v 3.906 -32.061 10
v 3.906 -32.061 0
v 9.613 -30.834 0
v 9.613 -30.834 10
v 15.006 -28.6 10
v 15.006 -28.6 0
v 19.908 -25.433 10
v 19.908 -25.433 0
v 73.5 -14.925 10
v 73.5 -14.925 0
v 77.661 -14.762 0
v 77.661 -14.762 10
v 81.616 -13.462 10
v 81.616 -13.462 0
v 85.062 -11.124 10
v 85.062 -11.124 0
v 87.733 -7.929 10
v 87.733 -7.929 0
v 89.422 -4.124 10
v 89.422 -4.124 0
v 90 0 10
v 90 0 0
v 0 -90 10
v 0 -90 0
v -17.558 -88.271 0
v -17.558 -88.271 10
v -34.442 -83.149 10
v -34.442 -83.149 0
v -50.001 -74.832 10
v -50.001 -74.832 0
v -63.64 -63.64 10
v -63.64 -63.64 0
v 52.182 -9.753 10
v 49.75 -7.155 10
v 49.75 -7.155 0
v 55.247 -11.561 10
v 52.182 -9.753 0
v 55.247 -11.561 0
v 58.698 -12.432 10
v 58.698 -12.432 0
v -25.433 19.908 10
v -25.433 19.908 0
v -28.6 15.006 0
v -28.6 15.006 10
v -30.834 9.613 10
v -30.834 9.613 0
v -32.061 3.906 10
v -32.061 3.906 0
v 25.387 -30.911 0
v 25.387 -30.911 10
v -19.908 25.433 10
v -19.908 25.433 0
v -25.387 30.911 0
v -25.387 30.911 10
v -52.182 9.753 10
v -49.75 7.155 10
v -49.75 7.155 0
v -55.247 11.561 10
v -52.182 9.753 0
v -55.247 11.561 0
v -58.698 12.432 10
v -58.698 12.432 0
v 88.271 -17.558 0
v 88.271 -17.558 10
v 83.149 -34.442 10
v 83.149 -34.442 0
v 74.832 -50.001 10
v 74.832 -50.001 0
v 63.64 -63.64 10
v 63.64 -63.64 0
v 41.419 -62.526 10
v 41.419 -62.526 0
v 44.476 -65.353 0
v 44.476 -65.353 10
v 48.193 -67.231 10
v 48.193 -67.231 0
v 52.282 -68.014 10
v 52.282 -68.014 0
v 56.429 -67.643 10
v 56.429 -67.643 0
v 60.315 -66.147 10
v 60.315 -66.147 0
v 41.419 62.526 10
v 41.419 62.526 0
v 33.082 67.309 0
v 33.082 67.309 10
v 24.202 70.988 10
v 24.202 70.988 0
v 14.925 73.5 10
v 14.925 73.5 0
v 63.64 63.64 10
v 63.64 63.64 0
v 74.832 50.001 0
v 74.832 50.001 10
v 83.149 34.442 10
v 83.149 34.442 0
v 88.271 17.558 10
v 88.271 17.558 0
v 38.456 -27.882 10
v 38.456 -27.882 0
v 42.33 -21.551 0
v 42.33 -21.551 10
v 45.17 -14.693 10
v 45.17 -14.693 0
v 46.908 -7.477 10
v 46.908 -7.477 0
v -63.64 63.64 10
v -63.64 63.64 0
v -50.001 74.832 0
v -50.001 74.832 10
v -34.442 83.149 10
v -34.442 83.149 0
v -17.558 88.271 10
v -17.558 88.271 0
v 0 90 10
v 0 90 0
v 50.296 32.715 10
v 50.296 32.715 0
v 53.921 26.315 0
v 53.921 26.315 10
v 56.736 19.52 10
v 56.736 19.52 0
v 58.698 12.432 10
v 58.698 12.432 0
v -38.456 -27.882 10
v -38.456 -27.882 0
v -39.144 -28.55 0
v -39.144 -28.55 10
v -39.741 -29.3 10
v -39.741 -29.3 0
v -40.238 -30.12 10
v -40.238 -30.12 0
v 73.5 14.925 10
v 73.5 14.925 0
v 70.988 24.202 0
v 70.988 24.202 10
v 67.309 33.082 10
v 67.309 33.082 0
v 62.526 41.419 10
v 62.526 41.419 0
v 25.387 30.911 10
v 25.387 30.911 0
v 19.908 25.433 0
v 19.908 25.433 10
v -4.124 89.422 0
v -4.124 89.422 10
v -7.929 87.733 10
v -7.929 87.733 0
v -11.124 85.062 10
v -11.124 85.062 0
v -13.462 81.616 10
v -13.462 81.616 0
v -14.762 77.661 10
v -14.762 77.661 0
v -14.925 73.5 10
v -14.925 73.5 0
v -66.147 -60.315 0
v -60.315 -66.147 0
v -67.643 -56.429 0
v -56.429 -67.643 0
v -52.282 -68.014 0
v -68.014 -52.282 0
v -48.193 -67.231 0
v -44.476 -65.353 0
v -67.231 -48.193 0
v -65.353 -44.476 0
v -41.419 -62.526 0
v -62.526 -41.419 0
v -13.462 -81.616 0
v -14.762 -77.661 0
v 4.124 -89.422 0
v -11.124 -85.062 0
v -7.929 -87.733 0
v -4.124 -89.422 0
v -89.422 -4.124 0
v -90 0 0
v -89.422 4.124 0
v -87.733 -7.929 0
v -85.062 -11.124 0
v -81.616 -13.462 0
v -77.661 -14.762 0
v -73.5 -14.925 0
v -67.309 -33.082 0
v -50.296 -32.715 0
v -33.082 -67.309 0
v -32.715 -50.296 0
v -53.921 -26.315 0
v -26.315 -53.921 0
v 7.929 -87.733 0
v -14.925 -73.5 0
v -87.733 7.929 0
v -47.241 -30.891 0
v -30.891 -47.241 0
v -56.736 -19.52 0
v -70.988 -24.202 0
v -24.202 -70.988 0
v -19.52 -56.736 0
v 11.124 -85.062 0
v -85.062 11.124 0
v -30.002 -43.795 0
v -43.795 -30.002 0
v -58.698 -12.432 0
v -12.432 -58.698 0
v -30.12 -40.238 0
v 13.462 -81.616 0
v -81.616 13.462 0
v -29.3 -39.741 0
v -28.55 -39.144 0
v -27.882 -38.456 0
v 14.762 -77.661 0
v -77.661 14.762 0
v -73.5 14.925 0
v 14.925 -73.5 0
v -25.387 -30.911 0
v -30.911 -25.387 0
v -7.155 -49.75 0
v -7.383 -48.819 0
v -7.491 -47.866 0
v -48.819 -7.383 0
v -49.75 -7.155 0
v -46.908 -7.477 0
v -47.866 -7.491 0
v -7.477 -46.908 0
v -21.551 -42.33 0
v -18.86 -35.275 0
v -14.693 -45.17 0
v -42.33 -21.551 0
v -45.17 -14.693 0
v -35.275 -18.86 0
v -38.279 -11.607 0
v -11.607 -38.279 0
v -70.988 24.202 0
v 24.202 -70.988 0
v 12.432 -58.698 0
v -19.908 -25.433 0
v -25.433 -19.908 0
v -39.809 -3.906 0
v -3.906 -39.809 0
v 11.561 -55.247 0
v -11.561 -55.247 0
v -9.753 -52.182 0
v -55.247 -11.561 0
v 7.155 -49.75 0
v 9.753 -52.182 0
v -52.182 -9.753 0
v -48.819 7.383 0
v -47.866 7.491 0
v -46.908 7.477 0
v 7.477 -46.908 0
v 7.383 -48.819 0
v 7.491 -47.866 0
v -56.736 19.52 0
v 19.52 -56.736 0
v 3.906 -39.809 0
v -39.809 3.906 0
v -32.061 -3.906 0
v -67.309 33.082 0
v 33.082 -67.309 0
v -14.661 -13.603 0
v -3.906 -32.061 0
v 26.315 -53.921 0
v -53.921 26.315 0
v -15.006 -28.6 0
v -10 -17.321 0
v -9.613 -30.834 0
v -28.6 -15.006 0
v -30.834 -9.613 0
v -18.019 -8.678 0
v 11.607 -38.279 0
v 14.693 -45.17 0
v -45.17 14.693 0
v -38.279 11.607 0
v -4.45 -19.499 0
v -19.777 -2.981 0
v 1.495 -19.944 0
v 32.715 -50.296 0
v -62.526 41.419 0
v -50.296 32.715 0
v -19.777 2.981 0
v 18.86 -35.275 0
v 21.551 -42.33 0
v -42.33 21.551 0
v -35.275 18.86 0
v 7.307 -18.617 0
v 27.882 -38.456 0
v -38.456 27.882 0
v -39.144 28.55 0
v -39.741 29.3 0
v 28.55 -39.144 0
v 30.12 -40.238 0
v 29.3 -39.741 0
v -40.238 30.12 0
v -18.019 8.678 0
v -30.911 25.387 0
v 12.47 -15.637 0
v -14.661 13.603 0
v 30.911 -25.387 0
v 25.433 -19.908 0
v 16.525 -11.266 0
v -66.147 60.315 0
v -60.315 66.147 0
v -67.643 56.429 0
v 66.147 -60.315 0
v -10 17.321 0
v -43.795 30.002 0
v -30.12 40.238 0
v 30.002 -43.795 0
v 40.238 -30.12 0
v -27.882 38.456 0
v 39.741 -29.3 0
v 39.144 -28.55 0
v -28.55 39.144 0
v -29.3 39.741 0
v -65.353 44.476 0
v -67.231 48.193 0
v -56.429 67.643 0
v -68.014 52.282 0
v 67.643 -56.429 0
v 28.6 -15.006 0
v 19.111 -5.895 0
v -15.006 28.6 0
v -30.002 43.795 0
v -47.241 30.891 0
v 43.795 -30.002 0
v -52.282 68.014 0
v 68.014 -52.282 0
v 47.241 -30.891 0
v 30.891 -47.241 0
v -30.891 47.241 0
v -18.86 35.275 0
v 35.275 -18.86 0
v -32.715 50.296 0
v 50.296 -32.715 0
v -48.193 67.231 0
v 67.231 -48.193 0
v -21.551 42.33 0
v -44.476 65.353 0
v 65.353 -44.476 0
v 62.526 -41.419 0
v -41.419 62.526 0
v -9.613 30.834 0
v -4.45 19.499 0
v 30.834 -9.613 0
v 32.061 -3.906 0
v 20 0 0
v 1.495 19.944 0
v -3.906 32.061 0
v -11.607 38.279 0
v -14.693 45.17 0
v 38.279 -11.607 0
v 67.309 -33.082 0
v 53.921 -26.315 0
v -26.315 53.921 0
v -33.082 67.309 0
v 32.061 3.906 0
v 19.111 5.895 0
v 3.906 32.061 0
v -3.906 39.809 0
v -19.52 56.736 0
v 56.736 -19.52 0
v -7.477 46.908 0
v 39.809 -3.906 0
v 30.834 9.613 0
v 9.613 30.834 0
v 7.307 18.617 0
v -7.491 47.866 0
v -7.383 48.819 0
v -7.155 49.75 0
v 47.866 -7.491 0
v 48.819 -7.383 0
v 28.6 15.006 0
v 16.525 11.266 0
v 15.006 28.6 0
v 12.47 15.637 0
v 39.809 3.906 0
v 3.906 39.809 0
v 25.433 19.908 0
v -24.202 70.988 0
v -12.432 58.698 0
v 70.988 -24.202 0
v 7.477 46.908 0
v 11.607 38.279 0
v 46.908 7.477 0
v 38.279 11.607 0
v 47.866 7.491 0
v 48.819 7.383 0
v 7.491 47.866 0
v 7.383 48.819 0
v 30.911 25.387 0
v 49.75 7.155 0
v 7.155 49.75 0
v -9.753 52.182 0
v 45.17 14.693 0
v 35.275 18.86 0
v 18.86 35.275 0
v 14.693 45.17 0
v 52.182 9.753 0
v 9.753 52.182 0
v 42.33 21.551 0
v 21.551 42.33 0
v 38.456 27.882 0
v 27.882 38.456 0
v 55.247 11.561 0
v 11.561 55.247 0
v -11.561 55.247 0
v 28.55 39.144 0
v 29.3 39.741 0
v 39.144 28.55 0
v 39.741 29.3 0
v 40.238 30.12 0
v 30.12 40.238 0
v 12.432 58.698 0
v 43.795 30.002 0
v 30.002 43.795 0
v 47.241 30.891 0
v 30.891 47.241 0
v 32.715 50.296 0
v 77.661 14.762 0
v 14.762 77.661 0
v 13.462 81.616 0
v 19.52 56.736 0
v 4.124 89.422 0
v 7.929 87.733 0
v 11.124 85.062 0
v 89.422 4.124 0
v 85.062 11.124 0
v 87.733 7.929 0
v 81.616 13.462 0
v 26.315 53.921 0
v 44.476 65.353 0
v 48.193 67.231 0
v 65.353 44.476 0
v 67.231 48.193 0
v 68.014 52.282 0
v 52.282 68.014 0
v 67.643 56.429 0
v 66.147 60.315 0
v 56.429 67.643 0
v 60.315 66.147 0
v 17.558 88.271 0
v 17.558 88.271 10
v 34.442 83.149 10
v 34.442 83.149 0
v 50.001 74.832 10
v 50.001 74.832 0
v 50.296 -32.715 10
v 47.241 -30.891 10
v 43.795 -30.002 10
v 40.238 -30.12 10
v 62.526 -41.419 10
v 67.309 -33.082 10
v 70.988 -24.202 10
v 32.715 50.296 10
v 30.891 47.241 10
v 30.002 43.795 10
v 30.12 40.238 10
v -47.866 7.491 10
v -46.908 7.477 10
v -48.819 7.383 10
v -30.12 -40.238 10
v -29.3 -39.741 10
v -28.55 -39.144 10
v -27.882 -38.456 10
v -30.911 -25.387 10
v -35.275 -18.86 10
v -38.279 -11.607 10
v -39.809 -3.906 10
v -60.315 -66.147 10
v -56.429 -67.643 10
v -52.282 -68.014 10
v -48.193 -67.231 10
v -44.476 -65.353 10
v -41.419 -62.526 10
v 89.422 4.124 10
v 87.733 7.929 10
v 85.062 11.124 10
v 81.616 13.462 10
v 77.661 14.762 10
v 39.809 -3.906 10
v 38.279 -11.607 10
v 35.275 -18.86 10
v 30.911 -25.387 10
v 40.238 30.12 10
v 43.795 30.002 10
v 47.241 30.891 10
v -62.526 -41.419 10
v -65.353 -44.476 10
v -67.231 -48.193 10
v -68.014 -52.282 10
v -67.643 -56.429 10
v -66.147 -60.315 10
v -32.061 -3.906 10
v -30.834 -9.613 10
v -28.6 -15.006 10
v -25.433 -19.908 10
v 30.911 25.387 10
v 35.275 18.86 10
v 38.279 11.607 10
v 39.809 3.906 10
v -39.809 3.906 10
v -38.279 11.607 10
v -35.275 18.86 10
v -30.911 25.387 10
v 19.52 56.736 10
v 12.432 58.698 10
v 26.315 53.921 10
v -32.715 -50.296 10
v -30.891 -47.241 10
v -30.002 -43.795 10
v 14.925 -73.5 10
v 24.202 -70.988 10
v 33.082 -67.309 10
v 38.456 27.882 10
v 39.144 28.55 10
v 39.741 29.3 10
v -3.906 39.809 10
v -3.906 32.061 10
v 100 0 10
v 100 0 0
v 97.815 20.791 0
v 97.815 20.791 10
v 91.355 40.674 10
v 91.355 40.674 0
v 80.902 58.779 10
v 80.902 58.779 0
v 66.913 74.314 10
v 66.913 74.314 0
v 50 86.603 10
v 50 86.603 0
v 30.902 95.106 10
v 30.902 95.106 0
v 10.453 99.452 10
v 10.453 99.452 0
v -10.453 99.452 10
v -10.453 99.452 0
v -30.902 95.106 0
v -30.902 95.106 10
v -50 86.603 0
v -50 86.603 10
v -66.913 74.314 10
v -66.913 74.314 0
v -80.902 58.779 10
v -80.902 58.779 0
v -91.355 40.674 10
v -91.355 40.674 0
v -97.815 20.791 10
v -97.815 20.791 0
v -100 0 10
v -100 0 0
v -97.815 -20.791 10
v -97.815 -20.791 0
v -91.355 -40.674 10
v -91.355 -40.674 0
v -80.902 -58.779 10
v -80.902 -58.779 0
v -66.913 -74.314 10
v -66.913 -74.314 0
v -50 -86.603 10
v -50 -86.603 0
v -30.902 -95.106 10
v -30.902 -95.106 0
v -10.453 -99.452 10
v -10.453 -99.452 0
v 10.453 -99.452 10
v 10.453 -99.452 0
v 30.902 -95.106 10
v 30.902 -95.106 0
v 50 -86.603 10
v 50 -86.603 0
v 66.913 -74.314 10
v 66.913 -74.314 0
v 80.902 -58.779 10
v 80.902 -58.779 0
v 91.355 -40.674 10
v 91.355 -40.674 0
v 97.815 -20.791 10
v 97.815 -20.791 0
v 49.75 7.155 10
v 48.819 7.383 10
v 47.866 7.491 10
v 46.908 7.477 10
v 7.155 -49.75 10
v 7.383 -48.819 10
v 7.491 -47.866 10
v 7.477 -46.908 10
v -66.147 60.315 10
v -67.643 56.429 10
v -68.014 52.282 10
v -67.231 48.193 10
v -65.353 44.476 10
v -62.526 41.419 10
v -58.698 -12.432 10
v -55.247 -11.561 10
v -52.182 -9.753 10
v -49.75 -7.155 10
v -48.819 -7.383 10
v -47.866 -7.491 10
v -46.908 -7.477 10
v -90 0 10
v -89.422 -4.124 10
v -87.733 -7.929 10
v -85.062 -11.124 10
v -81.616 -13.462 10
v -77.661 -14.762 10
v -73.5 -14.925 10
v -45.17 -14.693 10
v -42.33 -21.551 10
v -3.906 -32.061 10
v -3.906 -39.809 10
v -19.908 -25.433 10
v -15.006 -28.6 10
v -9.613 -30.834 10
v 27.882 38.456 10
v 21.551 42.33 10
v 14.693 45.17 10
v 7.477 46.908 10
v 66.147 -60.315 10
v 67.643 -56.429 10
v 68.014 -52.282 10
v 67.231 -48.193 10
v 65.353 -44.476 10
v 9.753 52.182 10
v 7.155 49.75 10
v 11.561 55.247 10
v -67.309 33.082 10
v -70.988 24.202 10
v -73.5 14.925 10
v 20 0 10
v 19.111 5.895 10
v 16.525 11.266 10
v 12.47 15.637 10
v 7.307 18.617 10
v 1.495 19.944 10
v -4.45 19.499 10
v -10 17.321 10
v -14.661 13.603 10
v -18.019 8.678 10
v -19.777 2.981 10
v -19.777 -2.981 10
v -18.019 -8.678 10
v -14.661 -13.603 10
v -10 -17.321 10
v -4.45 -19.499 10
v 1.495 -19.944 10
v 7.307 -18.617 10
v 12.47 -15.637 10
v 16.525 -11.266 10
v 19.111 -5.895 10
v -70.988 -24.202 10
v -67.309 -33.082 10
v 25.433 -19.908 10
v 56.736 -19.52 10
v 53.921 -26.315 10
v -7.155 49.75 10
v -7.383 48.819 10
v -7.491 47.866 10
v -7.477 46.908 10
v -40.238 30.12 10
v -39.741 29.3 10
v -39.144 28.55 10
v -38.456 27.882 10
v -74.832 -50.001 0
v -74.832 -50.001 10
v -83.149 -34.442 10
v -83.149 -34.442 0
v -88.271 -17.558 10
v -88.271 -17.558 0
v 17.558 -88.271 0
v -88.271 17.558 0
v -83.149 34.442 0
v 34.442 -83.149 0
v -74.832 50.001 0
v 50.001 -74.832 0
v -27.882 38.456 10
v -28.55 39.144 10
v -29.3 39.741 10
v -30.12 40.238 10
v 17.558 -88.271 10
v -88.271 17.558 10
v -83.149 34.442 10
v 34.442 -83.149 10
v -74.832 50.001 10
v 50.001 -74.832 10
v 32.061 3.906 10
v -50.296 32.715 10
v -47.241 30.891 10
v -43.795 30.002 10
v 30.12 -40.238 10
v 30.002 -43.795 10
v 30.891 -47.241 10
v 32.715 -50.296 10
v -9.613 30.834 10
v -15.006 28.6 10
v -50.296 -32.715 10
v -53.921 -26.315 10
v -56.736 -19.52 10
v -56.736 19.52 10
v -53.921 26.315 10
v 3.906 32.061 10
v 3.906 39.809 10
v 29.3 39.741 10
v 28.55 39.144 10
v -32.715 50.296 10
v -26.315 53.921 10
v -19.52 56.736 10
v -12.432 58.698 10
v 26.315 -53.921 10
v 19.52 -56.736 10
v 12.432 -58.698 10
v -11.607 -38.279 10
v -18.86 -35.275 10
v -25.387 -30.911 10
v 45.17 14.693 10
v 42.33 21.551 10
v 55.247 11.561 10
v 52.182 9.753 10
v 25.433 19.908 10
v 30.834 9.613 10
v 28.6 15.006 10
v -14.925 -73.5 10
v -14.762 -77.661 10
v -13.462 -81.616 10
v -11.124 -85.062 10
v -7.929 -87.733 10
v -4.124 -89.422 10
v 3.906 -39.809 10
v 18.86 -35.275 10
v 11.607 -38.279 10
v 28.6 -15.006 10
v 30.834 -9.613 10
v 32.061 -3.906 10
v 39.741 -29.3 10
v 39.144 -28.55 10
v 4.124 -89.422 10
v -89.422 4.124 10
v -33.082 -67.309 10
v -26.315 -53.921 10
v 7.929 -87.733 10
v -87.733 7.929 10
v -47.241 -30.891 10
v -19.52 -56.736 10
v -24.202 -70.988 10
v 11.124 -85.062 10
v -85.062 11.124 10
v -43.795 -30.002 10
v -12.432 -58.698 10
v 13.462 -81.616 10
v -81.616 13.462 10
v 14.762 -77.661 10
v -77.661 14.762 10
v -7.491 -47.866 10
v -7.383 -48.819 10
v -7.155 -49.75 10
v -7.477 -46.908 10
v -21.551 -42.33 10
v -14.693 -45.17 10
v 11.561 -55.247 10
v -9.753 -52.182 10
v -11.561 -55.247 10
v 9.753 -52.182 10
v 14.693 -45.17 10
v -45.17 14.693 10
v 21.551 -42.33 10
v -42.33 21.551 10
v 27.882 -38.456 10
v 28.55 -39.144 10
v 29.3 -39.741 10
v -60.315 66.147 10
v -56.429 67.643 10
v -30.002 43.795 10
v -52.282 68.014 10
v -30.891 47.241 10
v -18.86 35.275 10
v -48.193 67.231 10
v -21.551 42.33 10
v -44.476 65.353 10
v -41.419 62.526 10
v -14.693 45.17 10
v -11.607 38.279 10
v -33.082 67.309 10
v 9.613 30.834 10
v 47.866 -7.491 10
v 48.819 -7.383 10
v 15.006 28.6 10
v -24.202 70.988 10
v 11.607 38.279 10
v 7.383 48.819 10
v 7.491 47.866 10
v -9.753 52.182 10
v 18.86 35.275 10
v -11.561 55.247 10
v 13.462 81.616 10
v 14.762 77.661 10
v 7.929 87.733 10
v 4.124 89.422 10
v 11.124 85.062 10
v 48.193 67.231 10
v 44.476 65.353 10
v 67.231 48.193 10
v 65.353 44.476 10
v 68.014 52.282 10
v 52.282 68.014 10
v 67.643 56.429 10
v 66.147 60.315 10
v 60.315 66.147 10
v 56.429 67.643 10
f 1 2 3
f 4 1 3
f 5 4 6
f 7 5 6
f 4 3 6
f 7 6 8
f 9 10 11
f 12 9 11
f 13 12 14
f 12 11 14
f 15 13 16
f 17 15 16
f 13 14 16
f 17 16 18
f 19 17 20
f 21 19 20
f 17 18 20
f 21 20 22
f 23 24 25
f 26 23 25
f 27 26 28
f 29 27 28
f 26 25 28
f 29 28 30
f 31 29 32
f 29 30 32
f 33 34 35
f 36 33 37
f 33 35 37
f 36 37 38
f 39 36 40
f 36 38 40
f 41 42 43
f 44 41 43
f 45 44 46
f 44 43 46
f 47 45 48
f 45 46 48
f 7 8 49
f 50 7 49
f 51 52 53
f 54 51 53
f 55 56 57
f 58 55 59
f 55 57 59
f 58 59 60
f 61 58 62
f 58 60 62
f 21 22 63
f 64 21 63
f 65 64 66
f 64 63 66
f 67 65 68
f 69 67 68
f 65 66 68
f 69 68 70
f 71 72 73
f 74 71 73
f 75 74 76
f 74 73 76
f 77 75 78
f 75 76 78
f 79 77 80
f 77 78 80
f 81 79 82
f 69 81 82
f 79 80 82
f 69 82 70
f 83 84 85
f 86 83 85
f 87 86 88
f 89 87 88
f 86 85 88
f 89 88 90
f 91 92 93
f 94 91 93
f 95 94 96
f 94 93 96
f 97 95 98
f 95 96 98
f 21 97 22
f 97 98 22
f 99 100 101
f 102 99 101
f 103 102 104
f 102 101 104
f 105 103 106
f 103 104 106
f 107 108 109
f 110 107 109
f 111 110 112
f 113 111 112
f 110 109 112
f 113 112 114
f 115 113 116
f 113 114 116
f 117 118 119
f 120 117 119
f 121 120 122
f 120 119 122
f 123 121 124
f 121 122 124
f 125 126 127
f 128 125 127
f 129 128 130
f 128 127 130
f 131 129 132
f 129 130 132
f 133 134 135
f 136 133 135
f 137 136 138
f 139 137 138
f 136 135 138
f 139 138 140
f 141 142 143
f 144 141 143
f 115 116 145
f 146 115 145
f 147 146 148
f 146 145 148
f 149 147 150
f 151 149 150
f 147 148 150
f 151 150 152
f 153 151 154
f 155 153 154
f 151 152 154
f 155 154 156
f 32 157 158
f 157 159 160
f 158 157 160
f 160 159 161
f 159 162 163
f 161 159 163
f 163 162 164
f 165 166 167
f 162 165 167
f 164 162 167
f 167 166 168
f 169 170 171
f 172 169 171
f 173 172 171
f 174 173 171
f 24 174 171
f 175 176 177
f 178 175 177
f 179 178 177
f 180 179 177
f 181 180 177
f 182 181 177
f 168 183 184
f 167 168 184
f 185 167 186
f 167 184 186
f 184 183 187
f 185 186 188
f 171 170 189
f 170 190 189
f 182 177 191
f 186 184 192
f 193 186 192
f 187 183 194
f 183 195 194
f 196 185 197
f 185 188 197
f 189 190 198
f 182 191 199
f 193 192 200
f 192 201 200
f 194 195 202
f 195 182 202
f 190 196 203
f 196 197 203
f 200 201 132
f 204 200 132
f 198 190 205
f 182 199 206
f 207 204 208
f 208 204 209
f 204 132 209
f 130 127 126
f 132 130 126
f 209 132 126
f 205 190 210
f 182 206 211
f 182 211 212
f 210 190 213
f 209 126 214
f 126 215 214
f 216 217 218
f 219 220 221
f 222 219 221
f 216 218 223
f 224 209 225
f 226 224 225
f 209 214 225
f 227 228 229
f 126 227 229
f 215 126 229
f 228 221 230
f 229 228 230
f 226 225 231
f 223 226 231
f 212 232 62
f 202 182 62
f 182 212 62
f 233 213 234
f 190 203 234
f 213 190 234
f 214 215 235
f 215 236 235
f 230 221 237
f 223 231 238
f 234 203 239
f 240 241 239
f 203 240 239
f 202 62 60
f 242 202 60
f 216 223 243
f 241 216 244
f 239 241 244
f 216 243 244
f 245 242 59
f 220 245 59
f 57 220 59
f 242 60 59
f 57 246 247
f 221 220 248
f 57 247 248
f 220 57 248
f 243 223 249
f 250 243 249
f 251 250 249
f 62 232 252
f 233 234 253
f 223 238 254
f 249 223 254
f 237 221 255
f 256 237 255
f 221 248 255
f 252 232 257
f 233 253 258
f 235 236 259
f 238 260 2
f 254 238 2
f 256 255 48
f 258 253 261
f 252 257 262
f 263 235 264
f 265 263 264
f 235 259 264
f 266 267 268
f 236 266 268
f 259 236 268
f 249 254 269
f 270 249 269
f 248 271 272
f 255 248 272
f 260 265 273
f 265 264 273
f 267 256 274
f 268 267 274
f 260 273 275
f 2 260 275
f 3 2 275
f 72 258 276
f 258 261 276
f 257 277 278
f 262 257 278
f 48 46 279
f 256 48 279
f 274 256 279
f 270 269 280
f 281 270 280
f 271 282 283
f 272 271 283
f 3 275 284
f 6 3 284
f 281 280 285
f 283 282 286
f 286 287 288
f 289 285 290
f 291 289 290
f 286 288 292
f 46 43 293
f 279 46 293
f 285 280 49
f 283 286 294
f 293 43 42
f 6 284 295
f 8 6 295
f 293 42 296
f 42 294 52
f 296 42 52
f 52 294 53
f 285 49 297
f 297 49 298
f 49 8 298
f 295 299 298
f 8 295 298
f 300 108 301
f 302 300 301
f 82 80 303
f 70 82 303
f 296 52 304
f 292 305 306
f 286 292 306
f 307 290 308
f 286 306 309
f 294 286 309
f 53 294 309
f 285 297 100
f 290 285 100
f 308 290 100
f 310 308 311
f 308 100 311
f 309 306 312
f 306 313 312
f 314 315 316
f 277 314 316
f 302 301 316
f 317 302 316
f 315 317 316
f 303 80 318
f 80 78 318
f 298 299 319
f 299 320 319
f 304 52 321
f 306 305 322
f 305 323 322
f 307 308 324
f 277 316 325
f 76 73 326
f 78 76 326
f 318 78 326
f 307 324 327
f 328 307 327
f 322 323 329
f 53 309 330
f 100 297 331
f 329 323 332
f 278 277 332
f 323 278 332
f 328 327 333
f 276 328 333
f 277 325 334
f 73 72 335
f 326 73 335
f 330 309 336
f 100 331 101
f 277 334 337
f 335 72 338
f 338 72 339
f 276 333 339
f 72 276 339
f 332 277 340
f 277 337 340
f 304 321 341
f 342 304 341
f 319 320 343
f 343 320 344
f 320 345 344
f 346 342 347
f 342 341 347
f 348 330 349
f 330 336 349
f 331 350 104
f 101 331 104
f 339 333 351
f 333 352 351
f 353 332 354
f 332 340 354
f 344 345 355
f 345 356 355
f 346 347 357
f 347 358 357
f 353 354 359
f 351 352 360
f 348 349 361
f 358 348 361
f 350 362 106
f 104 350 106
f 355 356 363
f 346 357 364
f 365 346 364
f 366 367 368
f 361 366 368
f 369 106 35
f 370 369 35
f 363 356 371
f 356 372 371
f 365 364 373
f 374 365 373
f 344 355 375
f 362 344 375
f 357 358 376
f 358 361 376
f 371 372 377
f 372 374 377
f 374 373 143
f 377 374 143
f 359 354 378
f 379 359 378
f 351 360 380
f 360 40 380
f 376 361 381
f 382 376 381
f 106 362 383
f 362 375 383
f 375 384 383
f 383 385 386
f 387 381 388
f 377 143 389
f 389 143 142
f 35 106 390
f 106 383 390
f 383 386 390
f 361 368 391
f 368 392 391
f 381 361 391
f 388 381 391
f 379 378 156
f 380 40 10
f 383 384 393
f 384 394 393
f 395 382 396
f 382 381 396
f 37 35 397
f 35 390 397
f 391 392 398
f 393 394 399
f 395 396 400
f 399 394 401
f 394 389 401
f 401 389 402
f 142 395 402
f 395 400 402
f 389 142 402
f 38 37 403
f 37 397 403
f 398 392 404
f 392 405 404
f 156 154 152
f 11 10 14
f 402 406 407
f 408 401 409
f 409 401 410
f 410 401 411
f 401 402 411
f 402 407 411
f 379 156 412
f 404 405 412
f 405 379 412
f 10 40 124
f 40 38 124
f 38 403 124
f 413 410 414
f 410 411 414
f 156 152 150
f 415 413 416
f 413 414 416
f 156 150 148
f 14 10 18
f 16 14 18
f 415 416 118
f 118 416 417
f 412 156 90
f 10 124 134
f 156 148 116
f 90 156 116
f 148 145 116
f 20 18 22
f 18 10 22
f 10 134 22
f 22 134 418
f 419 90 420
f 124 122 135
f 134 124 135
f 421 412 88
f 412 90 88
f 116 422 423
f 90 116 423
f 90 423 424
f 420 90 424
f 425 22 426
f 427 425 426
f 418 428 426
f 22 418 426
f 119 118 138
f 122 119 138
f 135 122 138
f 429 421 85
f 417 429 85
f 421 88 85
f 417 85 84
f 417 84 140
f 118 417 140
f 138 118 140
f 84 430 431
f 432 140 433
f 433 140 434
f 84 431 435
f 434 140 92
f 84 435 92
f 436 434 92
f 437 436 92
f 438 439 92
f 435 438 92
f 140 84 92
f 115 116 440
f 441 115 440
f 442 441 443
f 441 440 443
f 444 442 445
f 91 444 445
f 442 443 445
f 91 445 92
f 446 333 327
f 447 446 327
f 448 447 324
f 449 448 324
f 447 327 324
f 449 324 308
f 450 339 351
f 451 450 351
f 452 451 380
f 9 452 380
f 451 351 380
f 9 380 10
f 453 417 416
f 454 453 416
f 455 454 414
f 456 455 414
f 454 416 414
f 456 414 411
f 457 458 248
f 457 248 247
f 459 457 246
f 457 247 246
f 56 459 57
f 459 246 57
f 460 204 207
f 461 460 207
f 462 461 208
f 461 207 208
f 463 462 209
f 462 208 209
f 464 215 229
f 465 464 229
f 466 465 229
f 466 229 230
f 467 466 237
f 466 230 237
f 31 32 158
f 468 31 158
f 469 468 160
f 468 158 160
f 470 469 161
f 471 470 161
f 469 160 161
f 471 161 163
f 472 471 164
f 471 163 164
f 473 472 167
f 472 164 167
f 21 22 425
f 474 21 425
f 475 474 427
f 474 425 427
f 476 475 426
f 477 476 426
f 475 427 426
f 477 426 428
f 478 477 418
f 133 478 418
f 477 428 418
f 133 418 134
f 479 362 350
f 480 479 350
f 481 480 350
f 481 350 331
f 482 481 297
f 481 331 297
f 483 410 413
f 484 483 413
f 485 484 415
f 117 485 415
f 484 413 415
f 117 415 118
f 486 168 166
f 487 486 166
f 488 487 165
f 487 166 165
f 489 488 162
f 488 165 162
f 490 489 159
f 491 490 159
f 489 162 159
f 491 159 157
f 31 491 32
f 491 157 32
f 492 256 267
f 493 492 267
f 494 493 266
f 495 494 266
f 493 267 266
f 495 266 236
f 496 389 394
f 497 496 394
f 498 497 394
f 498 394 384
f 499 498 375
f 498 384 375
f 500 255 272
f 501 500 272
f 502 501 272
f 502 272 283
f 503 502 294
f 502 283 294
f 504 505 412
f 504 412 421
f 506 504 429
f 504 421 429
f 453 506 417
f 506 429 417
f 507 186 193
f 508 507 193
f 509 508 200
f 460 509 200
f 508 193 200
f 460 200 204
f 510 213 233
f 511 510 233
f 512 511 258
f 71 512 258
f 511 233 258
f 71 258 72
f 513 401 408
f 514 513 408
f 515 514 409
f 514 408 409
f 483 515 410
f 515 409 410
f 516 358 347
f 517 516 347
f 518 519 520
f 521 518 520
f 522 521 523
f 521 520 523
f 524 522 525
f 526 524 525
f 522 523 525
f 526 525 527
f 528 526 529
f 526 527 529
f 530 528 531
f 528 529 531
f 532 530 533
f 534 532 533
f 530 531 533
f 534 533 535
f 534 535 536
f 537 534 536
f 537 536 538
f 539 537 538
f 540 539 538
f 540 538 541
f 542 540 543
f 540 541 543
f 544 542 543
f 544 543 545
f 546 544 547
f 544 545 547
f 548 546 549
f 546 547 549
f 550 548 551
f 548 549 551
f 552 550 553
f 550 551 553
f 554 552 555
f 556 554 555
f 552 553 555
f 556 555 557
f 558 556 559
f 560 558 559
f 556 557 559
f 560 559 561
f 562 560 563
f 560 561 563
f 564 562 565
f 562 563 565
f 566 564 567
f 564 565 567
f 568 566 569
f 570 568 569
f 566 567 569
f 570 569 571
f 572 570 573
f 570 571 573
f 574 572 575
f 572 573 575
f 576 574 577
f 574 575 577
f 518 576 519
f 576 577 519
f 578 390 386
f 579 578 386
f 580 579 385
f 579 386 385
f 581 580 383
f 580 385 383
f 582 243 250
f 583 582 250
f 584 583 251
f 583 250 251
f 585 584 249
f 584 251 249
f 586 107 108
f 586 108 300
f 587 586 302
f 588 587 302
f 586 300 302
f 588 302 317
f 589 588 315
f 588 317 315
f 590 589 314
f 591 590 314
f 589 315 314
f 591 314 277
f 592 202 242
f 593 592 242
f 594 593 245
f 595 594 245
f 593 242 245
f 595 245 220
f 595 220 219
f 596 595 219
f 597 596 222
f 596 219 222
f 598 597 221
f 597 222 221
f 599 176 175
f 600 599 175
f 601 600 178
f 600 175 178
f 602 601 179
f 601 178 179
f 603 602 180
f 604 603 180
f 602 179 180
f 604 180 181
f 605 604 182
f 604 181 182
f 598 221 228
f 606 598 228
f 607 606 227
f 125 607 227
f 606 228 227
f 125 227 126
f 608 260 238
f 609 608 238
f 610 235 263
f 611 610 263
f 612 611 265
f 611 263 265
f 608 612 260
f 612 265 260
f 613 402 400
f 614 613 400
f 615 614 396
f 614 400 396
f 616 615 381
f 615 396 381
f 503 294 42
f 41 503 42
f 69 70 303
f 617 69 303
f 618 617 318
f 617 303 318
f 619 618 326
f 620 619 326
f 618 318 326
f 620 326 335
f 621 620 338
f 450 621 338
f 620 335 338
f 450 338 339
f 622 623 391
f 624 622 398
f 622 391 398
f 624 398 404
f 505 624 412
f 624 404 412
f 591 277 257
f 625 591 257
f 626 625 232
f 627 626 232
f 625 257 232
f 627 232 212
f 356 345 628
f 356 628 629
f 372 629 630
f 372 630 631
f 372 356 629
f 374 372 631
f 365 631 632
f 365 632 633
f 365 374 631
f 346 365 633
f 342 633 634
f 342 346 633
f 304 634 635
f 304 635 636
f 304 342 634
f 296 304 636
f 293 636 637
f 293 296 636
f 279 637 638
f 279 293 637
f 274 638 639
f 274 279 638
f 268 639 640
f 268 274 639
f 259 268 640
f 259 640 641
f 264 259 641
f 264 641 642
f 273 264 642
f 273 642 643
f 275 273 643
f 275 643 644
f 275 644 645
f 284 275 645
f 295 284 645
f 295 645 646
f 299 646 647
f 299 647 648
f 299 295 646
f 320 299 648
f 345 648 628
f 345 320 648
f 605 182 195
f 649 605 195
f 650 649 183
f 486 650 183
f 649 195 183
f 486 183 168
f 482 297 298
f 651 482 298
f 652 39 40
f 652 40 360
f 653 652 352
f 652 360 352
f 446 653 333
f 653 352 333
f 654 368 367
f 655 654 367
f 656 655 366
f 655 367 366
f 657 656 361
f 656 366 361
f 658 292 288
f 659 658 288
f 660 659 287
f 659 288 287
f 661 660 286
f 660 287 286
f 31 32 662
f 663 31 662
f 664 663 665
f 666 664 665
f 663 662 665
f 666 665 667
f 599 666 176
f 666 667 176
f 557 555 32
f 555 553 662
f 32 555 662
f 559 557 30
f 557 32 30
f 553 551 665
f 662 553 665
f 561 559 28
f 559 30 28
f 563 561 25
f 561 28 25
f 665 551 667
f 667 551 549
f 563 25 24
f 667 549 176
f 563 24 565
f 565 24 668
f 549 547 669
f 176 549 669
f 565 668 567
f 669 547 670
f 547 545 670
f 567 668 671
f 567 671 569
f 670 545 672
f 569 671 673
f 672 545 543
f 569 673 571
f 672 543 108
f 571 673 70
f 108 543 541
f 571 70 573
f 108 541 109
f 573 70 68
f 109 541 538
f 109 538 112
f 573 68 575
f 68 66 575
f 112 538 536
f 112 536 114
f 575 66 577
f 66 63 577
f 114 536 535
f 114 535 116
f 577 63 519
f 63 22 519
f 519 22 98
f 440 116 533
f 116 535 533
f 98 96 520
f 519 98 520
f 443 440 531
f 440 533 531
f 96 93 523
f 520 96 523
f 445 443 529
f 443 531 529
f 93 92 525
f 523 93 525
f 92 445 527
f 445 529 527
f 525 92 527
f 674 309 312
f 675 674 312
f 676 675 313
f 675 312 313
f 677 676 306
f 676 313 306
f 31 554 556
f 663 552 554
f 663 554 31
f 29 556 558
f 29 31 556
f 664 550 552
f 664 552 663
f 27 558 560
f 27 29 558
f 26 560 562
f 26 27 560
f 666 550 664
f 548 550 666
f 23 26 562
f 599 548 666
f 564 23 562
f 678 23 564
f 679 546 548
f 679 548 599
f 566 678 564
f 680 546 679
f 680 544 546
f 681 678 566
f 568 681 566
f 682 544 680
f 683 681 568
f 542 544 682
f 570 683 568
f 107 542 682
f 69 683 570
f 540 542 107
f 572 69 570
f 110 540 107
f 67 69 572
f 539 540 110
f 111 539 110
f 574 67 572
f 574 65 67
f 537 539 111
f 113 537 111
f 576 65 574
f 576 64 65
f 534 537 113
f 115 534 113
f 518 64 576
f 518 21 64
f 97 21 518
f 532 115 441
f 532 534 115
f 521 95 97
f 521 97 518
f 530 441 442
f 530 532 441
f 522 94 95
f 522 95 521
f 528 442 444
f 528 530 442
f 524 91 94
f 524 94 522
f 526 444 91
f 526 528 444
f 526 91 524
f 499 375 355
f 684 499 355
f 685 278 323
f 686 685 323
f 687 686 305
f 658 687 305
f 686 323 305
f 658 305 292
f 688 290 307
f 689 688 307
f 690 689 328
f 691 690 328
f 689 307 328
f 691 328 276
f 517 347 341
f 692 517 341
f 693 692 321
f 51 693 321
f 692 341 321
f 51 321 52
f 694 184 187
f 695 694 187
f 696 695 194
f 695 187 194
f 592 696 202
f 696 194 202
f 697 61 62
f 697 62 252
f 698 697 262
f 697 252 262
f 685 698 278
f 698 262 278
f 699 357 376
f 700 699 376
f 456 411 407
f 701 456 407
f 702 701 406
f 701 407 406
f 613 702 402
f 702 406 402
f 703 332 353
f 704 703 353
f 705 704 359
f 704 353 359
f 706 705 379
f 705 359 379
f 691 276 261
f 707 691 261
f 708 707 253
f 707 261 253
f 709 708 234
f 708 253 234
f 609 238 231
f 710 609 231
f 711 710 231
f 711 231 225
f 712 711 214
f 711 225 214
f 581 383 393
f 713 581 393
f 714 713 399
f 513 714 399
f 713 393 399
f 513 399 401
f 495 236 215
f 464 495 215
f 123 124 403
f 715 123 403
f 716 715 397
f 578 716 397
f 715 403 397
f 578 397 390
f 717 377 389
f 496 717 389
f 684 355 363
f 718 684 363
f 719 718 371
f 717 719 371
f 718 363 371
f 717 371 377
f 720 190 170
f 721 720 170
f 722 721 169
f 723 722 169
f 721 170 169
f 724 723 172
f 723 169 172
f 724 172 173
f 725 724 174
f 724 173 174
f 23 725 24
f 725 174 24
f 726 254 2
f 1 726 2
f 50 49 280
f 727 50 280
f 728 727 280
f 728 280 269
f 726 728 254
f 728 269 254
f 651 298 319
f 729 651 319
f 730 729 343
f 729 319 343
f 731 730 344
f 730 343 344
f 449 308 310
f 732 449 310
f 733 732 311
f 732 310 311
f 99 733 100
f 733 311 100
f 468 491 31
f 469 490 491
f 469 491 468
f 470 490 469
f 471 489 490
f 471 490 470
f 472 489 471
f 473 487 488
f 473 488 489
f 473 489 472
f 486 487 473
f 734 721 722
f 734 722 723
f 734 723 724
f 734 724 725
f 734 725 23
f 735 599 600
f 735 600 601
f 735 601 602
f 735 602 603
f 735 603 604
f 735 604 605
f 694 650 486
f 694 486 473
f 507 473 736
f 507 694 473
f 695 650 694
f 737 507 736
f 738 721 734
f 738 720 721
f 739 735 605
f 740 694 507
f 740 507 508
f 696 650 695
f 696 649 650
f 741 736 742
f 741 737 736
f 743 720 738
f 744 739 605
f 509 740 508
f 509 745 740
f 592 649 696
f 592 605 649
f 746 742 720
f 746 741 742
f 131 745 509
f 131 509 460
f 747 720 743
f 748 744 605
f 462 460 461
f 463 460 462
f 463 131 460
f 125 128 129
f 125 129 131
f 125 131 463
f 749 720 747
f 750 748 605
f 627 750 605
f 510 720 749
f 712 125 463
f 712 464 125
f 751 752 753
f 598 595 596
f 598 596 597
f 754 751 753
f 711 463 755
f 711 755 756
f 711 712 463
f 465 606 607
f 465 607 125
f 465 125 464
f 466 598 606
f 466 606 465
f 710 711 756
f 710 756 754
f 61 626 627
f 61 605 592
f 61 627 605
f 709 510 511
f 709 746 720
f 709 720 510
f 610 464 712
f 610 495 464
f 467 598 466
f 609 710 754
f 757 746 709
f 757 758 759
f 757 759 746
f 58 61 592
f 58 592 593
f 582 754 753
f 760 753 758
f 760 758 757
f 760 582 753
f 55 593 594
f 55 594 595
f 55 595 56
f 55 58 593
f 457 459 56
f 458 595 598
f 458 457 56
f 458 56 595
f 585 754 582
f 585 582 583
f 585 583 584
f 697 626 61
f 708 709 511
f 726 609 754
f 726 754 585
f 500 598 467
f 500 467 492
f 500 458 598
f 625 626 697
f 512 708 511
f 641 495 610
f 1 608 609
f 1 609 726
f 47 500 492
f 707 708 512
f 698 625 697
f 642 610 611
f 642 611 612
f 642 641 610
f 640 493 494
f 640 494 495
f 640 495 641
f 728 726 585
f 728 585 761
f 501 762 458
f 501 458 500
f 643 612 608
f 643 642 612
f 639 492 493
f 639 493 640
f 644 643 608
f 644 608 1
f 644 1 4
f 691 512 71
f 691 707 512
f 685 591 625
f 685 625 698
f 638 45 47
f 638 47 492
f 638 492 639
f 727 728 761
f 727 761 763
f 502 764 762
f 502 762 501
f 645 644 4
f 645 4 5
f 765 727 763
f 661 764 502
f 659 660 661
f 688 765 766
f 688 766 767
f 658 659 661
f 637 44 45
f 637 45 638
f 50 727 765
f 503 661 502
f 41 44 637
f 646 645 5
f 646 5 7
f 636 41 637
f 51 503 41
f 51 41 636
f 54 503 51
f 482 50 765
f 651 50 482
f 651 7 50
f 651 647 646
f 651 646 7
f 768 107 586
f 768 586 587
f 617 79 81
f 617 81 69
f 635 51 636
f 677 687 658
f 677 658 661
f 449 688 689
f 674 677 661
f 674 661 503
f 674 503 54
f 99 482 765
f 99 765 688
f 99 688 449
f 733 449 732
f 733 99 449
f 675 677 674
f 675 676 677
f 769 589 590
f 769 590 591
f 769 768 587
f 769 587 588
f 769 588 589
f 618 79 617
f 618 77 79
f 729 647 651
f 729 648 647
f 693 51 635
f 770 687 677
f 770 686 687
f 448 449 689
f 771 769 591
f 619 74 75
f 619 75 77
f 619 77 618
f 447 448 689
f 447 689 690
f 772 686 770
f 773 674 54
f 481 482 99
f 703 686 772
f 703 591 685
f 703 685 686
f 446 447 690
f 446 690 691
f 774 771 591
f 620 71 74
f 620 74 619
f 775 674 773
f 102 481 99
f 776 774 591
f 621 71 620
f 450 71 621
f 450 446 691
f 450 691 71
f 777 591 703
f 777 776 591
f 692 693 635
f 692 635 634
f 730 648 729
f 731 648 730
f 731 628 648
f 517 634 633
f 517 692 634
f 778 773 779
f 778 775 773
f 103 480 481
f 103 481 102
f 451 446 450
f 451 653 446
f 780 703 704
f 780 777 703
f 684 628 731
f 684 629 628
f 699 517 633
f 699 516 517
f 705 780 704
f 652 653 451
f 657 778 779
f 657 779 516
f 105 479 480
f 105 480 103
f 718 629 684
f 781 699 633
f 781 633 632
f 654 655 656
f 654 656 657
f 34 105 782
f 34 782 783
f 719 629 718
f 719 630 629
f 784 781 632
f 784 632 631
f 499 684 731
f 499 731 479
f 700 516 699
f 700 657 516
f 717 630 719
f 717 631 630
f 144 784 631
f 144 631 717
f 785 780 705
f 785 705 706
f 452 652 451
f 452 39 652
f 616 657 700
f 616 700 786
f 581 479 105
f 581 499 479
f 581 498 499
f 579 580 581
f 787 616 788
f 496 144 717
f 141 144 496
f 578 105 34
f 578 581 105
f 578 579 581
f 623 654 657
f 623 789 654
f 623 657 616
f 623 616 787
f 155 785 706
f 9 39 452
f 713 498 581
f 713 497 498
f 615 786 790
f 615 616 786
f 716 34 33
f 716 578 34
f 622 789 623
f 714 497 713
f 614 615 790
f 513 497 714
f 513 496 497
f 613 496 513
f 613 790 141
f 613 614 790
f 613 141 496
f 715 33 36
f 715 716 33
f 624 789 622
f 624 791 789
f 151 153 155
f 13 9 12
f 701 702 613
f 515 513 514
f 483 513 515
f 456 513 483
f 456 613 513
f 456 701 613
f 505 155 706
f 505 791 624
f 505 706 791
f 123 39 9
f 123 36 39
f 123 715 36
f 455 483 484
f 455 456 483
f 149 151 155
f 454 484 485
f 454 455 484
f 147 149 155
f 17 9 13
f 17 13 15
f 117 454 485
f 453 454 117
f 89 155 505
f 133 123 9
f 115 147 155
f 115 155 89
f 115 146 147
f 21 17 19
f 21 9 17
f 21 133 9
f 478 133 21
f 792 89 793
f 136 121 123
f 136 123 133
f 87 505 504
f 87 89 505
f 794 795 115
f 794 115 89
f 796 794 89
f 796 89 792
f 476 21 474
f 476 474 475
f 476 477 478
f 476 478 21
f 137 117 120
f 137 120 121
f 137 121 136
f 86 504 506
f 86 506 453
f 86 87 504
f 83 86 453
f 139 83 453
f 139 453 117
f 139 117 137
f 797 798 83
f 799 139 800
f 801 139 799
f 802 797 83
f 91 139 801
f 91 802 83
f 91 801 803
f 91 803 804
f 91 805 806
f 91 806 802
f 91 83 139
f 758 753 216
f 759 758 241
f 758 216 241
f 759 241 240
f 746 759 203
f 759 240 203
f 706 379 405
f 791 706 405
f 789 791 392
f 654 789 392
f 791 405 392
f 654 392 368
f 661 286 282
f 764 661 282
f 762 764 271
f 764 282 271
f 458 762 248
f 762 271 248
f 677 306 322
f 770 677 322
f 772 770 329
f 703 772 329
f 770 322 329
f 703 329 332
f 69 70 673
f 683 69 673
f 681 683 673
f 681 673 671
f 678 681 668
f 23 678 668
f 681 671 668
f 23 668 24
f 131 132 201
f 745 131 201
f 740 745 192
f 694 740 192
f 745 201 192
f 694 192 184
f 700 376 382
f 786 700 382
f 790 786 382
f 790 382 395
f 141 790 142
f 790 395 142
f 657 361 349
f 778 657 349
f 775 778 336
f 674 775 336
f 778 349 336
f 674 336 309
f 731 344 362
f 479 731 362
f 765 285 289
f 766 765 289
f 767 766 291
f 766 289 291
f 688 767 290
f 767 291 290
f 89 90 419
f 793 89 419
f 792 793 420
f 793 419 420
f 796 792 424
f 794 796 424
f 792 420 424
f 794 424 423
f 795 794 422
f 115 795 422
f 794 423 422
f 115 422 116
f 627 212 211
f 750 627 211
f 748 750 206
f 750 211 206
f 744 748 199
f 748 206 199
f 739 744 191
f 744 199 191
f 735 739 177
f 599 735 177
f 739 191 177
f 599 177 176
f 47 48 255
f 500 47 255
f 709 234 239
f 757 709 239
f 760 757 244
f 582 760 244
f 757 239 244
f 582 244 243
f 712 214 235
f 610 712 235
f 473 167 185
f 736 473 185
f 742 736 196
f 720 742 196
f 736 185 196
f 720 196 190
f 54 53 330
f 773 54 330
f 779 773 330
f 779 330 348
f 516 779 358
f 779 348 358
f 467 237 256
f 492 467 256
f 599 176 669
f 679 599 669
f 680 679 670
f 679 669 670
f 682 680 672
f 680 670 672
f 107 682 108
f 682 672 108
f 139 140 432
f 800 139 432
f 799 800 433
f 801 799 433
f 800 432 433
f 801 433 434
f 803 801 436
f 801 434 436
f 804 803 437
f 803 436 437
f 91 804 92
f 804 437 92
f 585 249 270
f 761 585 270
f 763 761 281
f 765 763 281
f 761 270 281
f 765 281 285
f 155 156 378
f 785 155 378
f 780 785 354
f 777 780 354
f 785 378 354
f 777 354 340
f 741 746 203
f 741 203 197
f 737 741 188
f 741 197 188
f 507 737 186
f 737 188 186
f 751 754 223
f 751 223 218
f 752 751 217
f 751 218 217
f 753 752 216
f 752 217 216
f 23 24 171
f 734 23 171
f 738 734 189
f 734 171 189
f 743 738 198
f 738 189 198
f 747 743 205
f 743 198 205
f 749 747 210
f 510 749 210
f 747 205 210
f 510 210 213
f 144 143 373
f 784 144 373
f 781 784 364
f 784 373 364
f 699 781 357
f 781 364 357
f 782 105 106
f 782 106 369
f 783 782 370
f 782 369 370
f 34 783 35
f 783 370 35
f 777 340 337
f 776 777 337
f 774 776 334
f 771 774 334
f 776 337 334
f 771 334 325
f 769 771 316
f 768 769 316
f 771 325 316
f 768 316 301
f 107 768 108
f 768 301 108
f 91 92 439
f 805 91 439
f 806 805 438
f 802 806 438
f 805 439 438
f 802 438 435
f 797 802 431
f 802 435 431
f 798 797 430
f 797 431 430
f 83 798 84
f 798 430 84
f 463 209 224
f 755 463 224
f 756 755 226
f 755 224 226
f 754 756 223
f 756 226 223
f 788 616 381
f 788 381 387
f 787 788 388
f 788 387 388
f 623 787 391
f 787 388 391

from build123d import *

# Parameters (mm, degrees)
SKETCH1_R             = 20
BOSS_EXTRUDE1_DEPTH   = 10
SKETCH1_R_2           = 100
BOSS_EXTRUDE1_2_DEPTH = 10


with BuildPart() as part:
    # Sketch1 → Boss-Extrude1 (new body)
    with BuildSketch(Plane.XY):
        with BuildLine():
            ThreePointArc((-62.525783877, -41.418912958), (-68.014199687, -52.282066996), (-63.639610261, -63.639610353))
            ThreePointArc((-63.639610261, -63.639610353), (-52.28206693, -68.014199684), (-41.418912958, -62.525783877))
            ThreePointArc((-41.418912958, -62.525783877), (-28.701257427, -69.290964938), (-14.924811557, -73.5))
            ThreePointArc((-14.924811557, -73.5), (-11.124297699, -85.062305934), (9.4e-08, -90))
            ThreePointArc((9.4e-08, -90), (11.124297762, -85.062305864), (14.924811557, -73.5))
            ThreePointArc((14.924811557, -73.5), (28.701257427, -69.290964938), (41.418912958, -62.525783877))
            ThreePointArc((41.418912958, -62.525783877), (52.282066931, -68.014199684), (63.639610262, -63.639610352))
            ThreePointArc((63.639610262, -63.639610352), (68.014199687, -52.282066995), (62.525783877, -41.418912958))
            ThreePointArc((62.525783877, -41.418912958), (69.290964938, -28.701257427), (73.5, -14.924811557))
            ThreePointArc((73.5, -14.924811557), (85.062305899, -11.124297731), (90, 0))
            ThreePointArc((90, 0), (85.062305899, 11.124297731), (73.5, 14.924811557))
            ThreePointArc((73.5, 14.924811557), (69.290964938, 28.701257427), (62.525783877, 41.418912958))
            ThreePointArc((62.525783877, 41.418912958), (68.014199686, 52.282066963), (63.639610307, 63.639610307))
            ThreePointArc((63.639610307, 63.639610307), (52.282066963, 68.014199686), (41.418912958, 62.525783877))
            ThreePointArc((41.418912958, 62.525783877), (28.701257427, 69.290964938), (14.924811557, 73.5))
            ThreePointArc((14.924811557, 73.5), (11.124297731, 85.062305899), (0, 90))
            ThreePointArc((0, 90), (-11.124297731, 85.062305899), (-14.924811557, 73.5))
            ThreePointArc((-14.924811557, 73.5), (-28.701257427, 69.290964938), (-41.418912958, 62.525783877))
            ThreePointArc((-41.418912958, 62.525783877), (-52.282067039, 68.014199689), (-63.639610415, 63.639610199))
            ThreePointArc((-63.639610415, 63.639610199), (-68.014199682, 52.282066887), (-62.525783877, 41.418912958))
            ThreePointArc((-62.525783877, 41.418912958), (-69.290964938, 28.701257427), (-73.5, 14.924811557))
            ThreePointArc((-73.5, 14.924811557), (-85.062305842, 11.124297782), (-90, 1.52e-07))
            ThreePointArc((-90, 1.52e-07), (-85.062305955, -11.12429768), (-73.5, -14.924811557))
            ThreePointArc((-73.5, -14.924811557), (-69.290964938, -28.701257427), (-62.525783877, -41.418912958))
        make_face()
        with BuildLine():
            ThreePointArc((-46.907894737, -7.476590891), (-43.884277794, -18.177463037), (-38.455638579, -27.88214234))
            ThreePointArc((-38.455638579, -27.88214234), (-39.454261392, -28.915104147), (-40.23758895, -30.119535778))
            ThreePointArc((-40.23758895, -30.119535778), (-45.549402712, -30.32281662), (-50.29644514, -32.714944693))
            ThreePointArc((-50.29644514, -32.714944693), (-55.432771951, -22.961005942), (-58.697916667, -12.43199819))
            ThreePointArc((-58.697916667, -12.43199819), (-53.649760793, -10.76682228), (-49.75, -7.154544011))
            ThreePointArc((-49.75, -7.154544011), (-48.344441998, -7.452309556), (-46.907894737, -7.476590891))
        make_face(mode=Mode.SUBTRACT)
        with BuildLine():
            ThreePointArc((58.697916667, 12.43199819), (53.649760793, 10.76682228), (49.75, 7.154544011))
            ThreePointArc((49.75, 7.154544011), (48.344441998, 7.452309556), (46.907894737, 7.476590891))
            ThreePointArc((46.907894737, 7.476590891), (43.884277794, 18.177463037), (38.455638579, 27.88214234))
            ThreePointArc((38.455638579, 27.88214234), (39.454261392, 28.915104147), (40.23758895, 30.119535778))
            ThreePointArc((40.23758895, 30.119535778), (45.549402712, 30.32281662), (50.29644514, 32.714944693))
            ThreePointArc((50.29644514, 32.714944693), (55.432771951, 22.961005942), (58.697916667, 12.43199819))
        make_face(mode=Mode.SUBTRACT)
        with BuildLine():
            Line((39.808783679, 3.906499965), (32.060781687, 3.906499965))
            ThreePointArc((32.060781687, 3.906499965), (29.839370469, 12.359871941), (25.432708758, 19.908083525))
            Line((25.432708758, 19.908083525), (30.911373507, 25.386748274))
            ThreePointArc((30.911373507, 25.386748274), (36.9551813, 15.307337295), (39.808783679, 3.906499965))
        make_face(mode=Mode.SUBTRACT)
        with BuildLine():
            ThreePointArc((32.714944693, 50.29644514), (30.32281662, 45.549402712), (30.119535778, 40.23758895))
            ThreePointArc((30.119535778, 40.23758895), (28.915104147, 39.454261392), (27.88214234, 38.455638579))
            ThreePointArc((27.88214234, 38.455638579), (18.177463037, 43.884277794), (7.476590891, 46.907894737))
            ThreePointArc((7.476590891, 46.907894737), (7.452309556, 48.344441998), (7.154544011, 49.75))
            ThreePointArc((7.154544011, 49.75), (10.76682228, 53.649760793), (12.43199819, 58.697916667))
            ThreePointArc((12.43199819, 58.697916667), (22.961005942, 55.432771951), (32.714944693, 50.29644514))
        make_face(mode=Mode.SUBTRACT)
        with BuildLine():
            ThreePointArc((50.29644514, -32.714944693), (45.549402712, -30.32281662), (40.23758895, -30.119535778))
            ThreePointArc((40.23758895, -30.119535778), (39.454261392, -28.915104147), (38.455638579, -27.88214234))
            ThreePointArc((38.455638579, -27.88214234), (43.884277794, -18.177463037), (46.907894737, -7.476590891))
            ThreePointArc((46.907894737, -7.476590891), (48.344441998, -7.452309556), (49.75, -7.154544011))
            ThreePointArc((49.75, -7.154544011), (53.649760793, -10.76682228), (58.697916667, -12.43199819))
            ThreePointArc((58.697916667, -12.43199819), (55.432771951, -22.961005942), (50.29644514, -32.714944693))
        make_face(mode=Mode.SUBTRACT)
        with BuildLine():
            ThreePointArc((-12.43199819, 58.697916667), (-10.76682228, 53.649760793), (-7.154544011, 49.75))
            ThreePointArc((-7.154544011, 49.75), (-7.452309556, 48.344441998), (-7.476590891, 46.907894737))
            ThreePointArc((-7.476590891, 46.907894737), (-18.177463037, 43.884277794), (-27.88214234, 38.455638579))
            ThreePointArc((-27.88214234, 38.455638579), (-28.915104147, 39.454261392), (-30.119535778, 40.23758895))
            ThreePointArc((-30.119535778, 40.23758895), (-30.32281662, 45.549402712), (-32.714944693, 50.29644514))
            ThreePointArc((-32.714944693, 50.29644514), (-22.961005942, 55.432771951), (-12.43199819, 58.697916667))
        make_face(mode=Mode.SUBTRACT)
        with BuildLine():
            ThreePointArc((19.908083525, 25.432708758), (12.359871941, 29.839370469), (3.906499965, 32.060781687))
            Line((3.906499965, 32.060781687), (3.906499965, 39.808783679))
            ThreePointArc((3.906499965, 39.808783679), (15.307337295, 36.9551813), (25.386748274, 30.911373507))
            Line((25.386748274, 30.911373507), (19.908083525, 25.432708758))
        make_face(mode=Mode.SUBTRACT)
        with BuildLine():
            ThreePointArc((12.43199819, -58.697916667), (10.76682228, -53.649760793), (7.154544011, -49.75))
            ThreePointArc((7.154544011, -49.75), (7.452309556, -48.344441998), (7.476590891, -46.907894737))
            ThreePointArc((7.476590891, -46.907894737), (18.177463037, -43.884277794), (27.88214234, -38.455638579))
            ThreePointArc((27.88214234, -38.455638579), (28.915104147, -39.454261392), (30.119535778, -40.23758895))
            ThreePointArc((30.119535778, -40.23758895), (30.32281662, -45.549402712), (32.714944693, -50.29644514))
            ThreePointArc((32.714944693, -50.29644514), (22.961005942, -55.432771951), (12.43199819, -58.697916667))
        make_face(mode=Mode.SUBTRACT)
        with BuildLine():
            ThreePointArc((-50.29644514, 32.714944693), (-45.549402712, 30.32281662), (-40.23758895, 30.119535778))
            ThreePointArc((-40.23758895, 30.119535778), (-39.454261392, 28.915104147), (-38.455638579, 27.88214234))
            ThreePointArc((-38.455638579, 27.88214234), (-43.884277794, 18.177463037), (-46.907894737, 7.476590891))
            ThreePointArc((-46.907894737, 7.476590891), (-48.344441998, 7.452309556), (-49.75, 7.154544011))
            ThreePointArc((-49.75, 7.154544011), (-53.649760793, 10.76682228), (-58.697916667, 12.43199819))
            ThreePointArc((-58.697916667, 12.43199819), (-55.432771951, 22.961005942), (-50.29644514, 32.714944693))
        make_face(mode=Mode.SUBTRACT)
        with BuildLine():
            ThreePointArc((39.808783679, -3.906499965), (36.9551813, -15.307337295), (30.911373507, -25.386748274))
            Line((30.911373507, -25.386748274), (25.432708758, -19.908083525))
            ThreePointArc((25.432708758, -19.908083525), (29.839370469, -12.359871941), (32.060781687, -3.906499965))
            Line((32.060781687, -3.906499965), (39.808783679, -3.906499965))
        make_face(mode=Mode.SUBTRACT)
        with BuildLine():
            ThreePointArc((-32.714944693, -50.29644514), (-30.32281662, -45.549402712), (-30.119535778, -40.23758895))
            ThreePointArc((-30.119535778, -40.23758895), (-28.915104147, -39.454261392), (-27.88214234, -38.455638579))
            ThreePointArc((-27.88214234, -38.455638579), (-18.177463037, -43.884277794), (-7.476590891, -46.907894737))
            ThreePointArc((-7.476590891, -46.907894737), (-7.452309556, -48.344441998), (-7.154544011, -49.75))
            ThreePointArc((-7.154544011, -49.75), (-10.76682228, -53.649760793), (-12.43199819, -58.697916667))
            ThreePointArc((-12.43199819, -58.697916667), (-22.961005942, -55.432771951), (-32.714944693, -50.29644514))
        make_face(mode=Mode.SUBTRACT)
        with BuildLine():
            ThreePointArc((-3.906499965, 32.060781687), (-12.359871941, 29.839370469), (-19.908083525, 25.432708758))
            Line((-19.908083525, 25.432708758), (-25.386748274, 30.911373507))
            ThreePointArc((-25.386748274, 30.911373507), (-15.307337295, 36.9551813), (-3.906499965, 39.808783679))
            Line((-3.906499965, 39.808783679), (-3.906499965, 32.060781687))
        make_face(mode=Mode.SUBTRACT)
        with BuildLine():
            ThreePointArc((25.386748274, -30.911373507), (15.307337295, -36.9551813), (3.906499965, -39.808783679))
            Line((3.906499965, -39.808783679), (3.906499965, -32.060781687))
            ThreePointArc((3.906499965, -32.060781687), (12.359871941, -29.839370469), (19.908083525, -25.432708758))
            Line((19.908083525, -25.432708758), (25.386748274, -30.911373507))
        make_face(mode=Mode.SUBTRACT)
        with BuildLine():
            ThreePointArc((-25.432708758, 19.908083525), (-29.839370469, 12.359871941), (-32.060781687, 3.906499965))
            Line((-32.060781687, 3.906499965), (-39.808783679, 3.906499965))
            ThreePointArc((-39.808783679, 3.906499965), (-36.9551813, 15.307337295), (-30.911373507, 25.386748274))
            Line((-30.911373507, 25.386748274), (-25.432708758, 19.908083525))
        make_face(mode=Mode.SUBTRACT)
        with BuildLine():
            ThreePointArc((-3.906499965, -39.808783679), (-15.307337295, -36.9551813), (-25.386748274, -30.911373507))
            Line((-25.386748274, -30.911373507), (-19.908083525, -25.432708758))
            ThreePointArc((-19.908083525, -25.432708758), (-12.359871941, -29.839370469), (-3.906499965, -32.060781687))
            Line((-3.906499965, -32.060781687), (-3.906499965, -39.808783679))
        make_face(mode=Mode.SUBTRACT)
        with BuildLine():
            ThreePointArc((-32.060781687, -3.906499965), (-29.839370469, -12.359871941), (-25.432708758, -19.908083525))
            Line((-25.432708758, -19.908083525), (-30.911373507, -25.386748274))
            ThreePointArc((-30.911373507, -25.386748274), (-36.9551813, -15.307337295), (-39.808783679, -3.906499965))
            Line((-39.808783679, -3.906499965), (-32.060781687, -3.906499965))
        make_face(mode=Mode.SUBTRACT)
        Circle(SKETCH1_R, mode=Mode.SUBTRACT)
    extrude(amount=BOSS_EXTRUDE1_DEPTH)


with BuildPart() as body_2:
    # Sketch1 → Boss-Extrude1 2 (new body)
    with BuildSketch(Plane.XY):
        Circle(SKETCH1_R_2)
        with BuildLine():
            ThreePointArc((9.4e-08, -90), (-34.441508839, -83.149157957), (-63.639610261, -63.639610353))
            ThreePointArc((-63.639610261, -63.639610353), (-83.149157943, -34.441508873), (-90, 1.52e-07))
            ThreePointArc((-90, 1.52e-07), (-83.149157926, 34.441508913), (-63.639610415, 63.639610199))
            ThreePointArc((-63.639610415, 63.639610199), (-34.441508983, 83.149157897), (0, 90))
            ThreePointArc((0, 90), (34.441508913, 83.149157926), (63.639610307, 63.639610307))
            ThreePointArc((63.639610307, 63.639610307), (83.149157926, 34.441508913), (90, 0))
            ThreePointArc((90, 0), (83.149157914, -34.441508942), (63.639610262, -63.639610352))
            ThreePointArc((63.639610262, -63.639610352), (34.441508927, -83.14915792), (9.4e-08, -90))
        make_face(mode=Mode.SUBTRACT)
    extrude(amount=BOSS_EXTRUDE1_2_DEPTH)


solid = Compound([part.part, body_2.part])
